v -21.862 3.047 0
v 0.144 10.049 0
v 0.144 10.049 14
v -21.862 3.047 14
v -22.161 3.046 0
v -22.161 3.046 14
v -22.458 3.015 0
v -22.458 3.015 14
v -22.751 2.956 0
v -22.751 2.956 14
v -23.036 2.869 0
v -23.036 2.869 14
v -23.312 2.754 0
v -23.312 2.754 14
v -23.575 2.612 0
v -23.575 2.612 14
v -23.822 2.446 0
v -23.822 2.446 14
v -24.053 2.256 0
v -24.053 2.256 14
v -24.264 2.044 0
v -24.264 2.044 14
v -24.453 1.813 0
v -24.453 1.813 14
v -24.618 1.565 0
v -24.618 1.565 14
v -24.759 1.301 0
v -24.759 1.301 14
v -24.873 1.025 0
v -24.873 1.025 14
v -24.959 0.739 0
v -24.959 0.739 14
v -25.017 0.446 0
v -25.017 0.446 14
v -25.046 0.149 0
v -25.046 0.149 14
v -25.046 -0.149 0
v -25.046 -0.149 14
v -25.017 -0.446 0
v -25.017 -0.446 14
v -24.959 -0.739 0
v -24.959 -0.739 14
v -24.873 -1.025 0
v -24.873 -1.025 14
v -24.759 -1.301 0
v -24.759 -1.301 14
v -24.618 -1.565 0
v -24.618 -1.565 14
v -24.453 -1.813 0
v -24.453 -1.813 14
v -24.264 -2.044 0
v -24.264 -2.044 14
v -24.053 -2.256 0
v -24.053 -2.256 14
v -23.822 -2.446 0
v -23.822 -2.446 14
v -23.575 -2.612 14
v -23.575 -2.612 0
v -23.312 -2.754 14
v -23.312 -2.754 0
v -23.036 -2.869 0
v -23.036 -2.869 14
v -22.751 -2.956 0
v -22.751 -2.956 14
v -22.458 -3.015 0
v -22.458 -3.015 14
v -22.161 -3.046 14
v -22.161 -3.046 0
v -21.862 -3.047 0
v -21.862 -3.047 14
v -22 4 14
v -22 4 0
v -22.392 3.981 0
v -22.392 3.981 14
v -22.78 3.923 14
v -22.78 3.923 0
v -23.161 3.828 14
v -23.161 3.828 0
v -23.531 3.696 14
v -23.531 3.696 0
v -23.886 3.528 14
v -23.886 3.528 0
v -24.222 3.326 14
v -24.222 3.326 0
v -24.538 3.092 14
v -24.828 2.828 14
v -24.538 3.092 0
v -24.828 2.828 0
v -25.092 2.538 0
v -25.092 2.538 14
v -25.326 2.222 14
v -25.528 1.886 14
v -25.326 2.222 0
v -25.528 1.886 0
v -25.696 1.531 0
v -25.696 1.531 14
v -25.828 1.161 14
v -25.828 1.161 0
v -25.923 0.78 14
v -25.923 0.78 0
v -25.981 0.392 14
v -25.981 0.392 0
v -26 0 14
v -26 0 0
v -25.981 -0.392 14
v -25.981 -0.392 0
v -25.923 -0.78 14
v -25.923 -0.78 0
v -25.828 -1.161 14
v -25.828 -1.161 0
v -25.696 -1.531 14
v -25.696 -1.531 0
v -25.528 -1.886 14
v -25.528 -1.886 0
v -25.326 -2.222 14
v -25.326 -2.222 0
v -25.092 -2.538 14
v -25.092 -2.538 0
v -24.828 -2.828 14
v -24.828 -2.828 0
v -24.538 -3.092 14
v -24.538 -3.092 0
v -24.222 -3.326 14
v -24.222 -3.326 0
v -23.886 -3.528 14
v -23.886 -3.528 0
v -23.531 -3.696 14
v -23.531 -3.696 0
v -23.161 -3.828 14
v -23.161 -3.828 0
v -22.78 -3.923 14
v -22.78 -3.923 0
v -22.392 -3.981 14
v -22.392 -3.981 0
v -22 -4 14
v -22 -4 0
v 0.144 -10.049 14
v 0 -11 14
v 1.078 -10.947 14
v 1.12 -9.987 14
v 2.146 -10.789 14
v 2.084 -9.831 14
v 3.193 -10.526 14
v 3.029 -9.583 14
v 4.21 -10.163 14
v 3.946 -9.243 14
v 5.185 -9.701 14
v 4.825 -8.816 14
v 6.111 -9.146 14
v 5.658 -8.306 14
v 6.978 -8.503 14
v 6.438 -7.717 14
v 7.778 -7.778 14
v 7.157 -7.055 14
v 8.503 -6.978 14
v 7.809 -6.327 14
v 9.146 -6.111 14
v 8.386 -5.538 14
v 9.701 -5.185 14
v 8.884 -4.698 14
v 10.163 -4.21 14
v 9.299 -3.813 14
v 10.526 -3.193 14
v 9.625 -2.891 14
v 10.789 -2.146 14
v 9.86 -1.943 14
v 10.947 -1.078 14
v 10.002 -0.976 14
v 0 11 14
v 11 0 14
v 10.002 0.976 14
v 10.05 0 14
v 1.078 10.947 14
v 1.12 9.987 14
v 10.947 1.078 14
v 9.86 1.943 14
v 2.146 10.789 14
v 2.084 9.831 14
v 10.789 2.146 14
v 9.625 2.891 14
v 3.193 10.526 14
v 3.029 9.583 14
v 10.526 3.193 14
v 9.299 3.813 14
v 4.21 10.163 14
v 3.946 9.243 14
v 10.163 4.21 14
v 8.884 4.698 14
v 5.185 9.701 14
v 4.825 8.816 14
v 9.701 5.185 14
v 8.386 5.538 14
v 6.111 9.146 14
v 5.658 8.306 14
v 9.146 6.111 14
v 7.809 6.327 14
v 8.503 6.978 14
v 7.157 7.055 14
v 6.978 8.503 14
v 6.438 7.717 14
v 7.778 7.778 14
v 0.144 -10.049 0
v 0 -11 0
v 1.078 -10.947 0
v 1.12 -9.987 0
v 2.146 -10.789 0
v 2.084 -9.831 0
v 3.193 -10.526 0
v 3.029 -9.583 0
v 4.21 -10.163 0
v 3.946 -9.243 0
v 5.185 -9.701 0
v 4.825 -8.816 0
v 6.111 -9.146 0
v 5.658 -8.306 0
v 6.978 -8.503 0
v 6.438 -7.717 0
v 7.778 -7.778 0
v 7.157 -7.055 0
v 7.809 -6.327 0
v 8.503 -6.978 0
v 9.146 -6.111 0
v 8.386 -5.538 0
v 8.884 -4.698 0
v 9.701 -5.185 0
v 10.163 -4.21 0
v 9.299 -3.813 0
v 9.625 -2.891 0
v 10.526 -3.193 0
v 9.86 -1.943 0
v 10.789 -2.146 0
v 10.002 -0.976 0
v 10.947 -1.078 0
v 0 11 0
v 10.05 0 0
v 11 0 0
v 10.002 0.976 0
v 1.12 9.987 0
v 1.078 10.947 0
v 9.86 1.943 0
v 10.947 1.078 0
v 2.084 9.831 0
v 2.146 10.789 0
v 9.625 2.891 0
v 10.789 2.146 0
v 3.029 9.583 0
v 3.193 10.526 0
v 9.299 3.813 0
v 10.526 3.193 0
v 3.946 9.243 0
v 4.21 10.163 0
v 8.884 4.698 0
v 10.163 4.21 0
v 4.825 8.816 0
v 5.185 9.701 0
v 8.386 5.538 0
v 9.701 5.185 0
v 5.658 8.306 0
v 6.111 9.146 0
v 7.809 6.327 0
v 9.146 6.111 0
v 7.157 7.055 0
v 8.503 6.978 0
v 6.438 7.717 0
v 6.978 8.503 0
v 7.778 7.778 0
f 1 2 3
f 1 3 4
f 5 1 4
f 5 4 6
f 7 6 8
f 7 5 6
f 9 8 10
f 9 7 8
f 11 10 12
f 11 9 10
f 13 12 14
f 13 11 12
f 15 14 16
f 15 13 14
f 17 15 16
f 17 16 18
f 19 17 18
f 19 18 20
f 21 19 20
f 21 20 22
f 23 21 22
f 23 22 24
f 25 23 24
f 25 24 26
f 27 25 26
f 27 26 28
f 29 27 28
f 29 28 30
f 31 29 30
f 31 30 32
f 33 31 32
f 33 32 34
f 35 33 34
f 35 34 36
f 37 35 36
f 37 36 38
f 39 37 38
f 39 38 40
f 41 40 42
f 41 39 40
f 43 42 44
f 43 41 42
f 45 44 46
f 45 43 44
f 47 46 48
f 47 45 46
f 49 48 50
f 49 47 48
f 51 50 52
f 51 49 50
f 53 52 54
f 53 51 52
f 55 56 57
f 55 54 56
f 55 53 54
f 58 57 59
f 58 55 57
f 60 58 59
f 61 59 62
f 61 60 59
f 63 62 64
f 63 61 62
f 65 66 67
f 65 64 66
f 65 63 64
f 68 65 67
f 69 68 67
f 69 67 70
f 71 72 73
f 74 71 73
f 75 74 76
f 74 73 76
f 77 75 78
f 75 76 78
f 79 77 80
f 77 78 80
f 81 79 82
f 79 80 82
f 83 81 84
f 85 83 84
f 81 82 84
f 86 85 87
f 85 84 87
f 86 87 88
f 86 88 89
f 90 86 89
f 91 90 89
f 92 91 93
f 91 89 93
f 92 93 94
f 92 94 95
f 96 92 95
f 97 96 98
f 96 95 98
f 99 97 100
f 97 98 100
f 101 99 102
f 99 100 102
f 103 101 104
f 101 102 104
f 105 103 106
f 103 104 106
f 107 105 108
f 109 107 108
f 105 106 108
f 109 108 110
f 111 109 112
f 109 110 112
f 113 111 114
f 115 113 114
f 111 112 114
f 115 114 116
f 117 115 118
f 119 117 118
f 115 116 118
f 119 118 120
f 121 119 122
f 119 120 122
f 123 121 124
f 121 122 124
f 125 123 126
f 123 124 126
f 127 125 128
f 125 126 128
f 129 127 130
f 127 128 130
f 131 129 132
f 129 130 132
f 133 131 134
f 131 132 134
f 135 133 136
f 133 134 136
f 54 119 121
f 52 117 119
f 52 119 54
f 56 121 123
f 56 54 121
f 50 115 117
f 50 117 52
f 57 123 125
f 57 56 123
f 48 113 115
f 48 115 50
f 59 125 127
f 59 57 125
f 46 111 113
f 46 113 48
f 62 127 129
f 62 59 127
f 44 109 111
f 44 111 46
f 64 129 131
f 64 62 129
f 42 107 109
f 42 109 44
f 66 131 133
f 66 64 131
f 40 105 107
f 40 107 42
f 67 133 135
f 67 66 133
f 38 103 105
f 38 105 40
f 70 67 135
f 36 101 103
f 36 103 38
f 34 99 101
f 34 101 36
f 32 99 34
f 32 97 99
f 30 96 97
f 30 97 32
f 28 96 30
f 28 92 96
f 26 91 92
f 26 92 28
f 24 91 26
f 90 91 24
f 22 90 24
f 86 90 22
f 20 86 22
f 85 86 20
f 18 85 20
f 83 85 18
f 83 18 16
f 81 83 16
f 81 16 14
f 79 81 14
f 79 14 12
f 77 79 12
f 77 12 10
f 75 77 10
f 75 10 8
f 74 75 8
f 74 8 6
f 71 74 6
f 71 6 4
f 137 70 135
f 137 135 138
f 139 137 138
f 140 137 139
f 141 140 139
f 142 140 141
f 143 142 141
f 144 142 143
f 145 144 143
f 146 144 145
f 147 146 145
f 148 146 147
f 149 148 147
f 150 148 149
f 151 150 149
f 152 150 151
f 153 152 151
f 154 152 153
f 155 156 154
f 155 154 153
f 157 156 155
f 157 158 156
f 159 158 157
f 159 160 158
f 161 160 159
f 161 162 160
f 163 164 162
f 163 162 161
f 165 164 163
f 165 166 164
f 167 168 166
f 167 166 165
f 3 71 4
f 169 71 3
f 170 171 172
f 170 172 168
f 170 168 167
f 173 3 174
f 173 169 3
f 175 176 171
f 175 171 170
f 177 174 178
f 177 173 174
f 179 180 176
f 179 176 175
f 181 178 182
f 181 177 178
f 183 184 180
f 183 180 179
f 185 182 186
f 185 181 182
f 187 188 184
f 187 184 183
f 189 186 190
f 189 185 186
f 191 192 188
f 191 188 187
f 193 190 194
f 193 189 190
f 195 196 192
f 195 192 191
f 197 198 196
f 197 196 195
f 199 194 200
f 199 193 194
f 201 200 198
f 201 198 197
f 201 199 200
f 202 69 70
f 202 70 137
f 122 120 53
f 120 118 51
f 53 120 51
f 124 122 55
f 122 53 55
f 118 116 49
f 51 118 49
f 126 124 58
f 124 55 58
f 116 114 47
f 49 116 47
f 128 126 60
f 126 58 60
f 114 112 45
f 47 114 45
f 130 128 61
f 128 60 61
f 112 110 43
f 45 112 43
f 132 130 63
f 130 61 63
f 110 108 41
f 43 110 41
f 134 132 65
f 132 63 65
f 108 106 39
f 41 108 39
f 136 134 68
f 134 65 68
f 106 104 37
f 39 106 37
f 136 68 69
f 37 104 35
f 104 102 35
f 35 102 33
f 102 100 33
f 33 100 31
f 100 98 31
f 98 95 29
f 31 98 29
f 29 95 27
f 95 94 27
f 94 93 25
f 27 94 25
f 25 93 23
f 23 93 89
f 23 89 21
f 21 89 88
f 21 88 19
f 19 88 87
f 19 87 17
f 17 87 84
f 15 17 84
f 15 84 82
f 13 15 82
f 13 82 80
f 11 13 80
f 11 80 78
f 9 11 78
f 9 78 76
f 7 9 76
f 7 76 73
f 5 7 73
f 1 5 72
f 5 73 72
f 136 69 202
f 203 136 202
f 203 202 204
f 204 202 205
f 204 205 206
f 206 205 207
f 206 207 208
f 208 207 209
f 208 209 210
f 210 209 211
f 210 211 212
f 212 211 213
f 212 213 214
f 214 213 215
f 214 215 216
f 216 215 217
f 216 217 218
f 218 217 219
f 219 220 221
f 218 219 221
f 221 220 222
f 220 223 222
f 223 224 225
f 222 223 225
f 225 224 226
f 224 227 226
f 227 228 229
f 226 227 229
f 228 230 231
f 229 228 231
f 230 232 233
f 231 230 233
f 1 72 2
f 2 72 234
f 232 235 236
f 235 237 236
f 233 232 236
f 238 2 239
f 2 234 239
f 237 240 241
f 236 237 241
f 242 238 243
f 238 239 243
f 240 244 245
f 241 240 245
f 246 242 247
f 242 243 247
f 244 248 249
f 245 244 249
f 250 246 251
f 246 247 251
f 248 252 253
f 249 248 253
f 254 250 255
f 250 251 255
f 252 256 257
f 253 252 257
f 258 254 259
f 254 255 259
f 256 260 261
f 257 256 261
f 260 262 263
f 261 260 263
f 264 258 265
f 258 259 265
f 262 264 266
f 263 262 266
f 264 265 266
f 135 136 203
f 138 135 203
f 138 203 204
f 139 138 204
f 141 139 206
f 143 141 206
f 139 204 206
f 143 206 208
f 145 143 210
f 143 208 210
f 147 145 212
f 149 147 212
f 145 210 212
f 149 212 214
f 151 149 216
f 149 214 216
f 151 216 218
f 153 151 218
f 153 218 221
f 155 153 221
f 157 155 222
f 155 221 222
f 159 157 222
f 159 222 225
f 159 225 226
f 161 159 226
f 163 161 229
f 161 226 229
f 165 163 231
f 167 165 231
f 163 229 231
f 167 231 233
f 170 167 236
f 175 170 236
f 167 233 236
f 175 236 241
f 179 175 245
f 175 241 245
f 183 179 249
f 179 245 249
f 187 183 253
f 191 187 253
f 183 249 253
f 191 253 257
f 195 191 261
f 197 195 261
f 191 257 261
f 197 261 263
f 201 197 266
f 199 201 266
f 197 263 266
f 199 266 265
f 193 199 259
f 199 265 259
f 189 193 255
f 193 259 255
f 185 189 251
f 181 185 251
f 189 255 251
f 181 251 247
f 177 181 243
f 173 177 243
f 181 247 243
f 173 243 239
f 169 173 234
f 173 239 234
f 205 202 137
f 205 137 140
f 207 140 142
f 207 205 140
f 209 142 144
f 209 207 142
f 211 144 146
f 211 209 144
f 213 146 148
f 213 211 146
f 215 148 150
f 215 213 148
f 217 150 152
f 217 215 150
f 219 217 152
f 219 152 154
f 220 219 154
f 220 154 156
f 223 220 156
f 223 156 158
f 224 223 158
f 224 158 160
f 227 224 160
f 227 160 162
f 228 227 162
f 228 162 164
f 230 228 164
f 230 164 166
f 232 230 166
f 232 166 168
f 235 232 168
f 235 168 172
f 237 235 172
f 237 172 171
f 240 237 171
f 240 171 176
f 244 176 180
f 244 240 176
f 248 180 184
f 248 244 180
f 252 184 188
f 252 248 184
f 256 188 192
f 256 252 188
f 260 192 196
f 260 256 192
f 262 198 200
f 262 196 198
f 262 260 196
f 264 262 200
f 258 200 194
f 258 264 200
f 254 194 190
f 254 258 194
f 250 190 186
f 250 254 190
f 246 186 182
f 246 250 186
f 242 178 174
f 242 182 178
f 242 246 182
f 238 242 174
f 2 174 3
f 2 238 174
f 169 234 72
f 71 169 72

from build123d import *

# Parameters (mm, degrees)
F2_DEPTH = 14
F3_DEPTH = 14.001


with BuildPart() as f2:
    # F0 (on Top) → F2 (new body)
    with BuildSketch(Plane.XY):
        with BuildLine():
            Line((0, 11), (-22, 4))
            ThreePointArc((-22, 4), (-26, 0), (-22, -4))
            Line((-22, -4), (0, -11))
            ThreePointArc((0, -11), (11, 0), (0, 11))
        make_face()
    extrude(amount=F2_DEPTH)

    # F1 (on face) → F3 (cut, through all)
    with BuildSketch(Plane.XY):
        with BuildLine():
            ThreePointArc((-21.862283, 3.046889), (-25.05, 0), (-21.862283, -3.046889))
            Line((-21.862283, -3.046889), (0.14424, -10.048965))
            ThreePointArc((0.14424, -10.048965), (10.05, 0), (0.14424, 10.048965))
            Line((0.14424, 10.048965), (-21.862283, 3.046889))
        make_face()
    extrude(amount=F3_DEPTH, mode=Mode.SUBTRACT)


solid = f2.part
